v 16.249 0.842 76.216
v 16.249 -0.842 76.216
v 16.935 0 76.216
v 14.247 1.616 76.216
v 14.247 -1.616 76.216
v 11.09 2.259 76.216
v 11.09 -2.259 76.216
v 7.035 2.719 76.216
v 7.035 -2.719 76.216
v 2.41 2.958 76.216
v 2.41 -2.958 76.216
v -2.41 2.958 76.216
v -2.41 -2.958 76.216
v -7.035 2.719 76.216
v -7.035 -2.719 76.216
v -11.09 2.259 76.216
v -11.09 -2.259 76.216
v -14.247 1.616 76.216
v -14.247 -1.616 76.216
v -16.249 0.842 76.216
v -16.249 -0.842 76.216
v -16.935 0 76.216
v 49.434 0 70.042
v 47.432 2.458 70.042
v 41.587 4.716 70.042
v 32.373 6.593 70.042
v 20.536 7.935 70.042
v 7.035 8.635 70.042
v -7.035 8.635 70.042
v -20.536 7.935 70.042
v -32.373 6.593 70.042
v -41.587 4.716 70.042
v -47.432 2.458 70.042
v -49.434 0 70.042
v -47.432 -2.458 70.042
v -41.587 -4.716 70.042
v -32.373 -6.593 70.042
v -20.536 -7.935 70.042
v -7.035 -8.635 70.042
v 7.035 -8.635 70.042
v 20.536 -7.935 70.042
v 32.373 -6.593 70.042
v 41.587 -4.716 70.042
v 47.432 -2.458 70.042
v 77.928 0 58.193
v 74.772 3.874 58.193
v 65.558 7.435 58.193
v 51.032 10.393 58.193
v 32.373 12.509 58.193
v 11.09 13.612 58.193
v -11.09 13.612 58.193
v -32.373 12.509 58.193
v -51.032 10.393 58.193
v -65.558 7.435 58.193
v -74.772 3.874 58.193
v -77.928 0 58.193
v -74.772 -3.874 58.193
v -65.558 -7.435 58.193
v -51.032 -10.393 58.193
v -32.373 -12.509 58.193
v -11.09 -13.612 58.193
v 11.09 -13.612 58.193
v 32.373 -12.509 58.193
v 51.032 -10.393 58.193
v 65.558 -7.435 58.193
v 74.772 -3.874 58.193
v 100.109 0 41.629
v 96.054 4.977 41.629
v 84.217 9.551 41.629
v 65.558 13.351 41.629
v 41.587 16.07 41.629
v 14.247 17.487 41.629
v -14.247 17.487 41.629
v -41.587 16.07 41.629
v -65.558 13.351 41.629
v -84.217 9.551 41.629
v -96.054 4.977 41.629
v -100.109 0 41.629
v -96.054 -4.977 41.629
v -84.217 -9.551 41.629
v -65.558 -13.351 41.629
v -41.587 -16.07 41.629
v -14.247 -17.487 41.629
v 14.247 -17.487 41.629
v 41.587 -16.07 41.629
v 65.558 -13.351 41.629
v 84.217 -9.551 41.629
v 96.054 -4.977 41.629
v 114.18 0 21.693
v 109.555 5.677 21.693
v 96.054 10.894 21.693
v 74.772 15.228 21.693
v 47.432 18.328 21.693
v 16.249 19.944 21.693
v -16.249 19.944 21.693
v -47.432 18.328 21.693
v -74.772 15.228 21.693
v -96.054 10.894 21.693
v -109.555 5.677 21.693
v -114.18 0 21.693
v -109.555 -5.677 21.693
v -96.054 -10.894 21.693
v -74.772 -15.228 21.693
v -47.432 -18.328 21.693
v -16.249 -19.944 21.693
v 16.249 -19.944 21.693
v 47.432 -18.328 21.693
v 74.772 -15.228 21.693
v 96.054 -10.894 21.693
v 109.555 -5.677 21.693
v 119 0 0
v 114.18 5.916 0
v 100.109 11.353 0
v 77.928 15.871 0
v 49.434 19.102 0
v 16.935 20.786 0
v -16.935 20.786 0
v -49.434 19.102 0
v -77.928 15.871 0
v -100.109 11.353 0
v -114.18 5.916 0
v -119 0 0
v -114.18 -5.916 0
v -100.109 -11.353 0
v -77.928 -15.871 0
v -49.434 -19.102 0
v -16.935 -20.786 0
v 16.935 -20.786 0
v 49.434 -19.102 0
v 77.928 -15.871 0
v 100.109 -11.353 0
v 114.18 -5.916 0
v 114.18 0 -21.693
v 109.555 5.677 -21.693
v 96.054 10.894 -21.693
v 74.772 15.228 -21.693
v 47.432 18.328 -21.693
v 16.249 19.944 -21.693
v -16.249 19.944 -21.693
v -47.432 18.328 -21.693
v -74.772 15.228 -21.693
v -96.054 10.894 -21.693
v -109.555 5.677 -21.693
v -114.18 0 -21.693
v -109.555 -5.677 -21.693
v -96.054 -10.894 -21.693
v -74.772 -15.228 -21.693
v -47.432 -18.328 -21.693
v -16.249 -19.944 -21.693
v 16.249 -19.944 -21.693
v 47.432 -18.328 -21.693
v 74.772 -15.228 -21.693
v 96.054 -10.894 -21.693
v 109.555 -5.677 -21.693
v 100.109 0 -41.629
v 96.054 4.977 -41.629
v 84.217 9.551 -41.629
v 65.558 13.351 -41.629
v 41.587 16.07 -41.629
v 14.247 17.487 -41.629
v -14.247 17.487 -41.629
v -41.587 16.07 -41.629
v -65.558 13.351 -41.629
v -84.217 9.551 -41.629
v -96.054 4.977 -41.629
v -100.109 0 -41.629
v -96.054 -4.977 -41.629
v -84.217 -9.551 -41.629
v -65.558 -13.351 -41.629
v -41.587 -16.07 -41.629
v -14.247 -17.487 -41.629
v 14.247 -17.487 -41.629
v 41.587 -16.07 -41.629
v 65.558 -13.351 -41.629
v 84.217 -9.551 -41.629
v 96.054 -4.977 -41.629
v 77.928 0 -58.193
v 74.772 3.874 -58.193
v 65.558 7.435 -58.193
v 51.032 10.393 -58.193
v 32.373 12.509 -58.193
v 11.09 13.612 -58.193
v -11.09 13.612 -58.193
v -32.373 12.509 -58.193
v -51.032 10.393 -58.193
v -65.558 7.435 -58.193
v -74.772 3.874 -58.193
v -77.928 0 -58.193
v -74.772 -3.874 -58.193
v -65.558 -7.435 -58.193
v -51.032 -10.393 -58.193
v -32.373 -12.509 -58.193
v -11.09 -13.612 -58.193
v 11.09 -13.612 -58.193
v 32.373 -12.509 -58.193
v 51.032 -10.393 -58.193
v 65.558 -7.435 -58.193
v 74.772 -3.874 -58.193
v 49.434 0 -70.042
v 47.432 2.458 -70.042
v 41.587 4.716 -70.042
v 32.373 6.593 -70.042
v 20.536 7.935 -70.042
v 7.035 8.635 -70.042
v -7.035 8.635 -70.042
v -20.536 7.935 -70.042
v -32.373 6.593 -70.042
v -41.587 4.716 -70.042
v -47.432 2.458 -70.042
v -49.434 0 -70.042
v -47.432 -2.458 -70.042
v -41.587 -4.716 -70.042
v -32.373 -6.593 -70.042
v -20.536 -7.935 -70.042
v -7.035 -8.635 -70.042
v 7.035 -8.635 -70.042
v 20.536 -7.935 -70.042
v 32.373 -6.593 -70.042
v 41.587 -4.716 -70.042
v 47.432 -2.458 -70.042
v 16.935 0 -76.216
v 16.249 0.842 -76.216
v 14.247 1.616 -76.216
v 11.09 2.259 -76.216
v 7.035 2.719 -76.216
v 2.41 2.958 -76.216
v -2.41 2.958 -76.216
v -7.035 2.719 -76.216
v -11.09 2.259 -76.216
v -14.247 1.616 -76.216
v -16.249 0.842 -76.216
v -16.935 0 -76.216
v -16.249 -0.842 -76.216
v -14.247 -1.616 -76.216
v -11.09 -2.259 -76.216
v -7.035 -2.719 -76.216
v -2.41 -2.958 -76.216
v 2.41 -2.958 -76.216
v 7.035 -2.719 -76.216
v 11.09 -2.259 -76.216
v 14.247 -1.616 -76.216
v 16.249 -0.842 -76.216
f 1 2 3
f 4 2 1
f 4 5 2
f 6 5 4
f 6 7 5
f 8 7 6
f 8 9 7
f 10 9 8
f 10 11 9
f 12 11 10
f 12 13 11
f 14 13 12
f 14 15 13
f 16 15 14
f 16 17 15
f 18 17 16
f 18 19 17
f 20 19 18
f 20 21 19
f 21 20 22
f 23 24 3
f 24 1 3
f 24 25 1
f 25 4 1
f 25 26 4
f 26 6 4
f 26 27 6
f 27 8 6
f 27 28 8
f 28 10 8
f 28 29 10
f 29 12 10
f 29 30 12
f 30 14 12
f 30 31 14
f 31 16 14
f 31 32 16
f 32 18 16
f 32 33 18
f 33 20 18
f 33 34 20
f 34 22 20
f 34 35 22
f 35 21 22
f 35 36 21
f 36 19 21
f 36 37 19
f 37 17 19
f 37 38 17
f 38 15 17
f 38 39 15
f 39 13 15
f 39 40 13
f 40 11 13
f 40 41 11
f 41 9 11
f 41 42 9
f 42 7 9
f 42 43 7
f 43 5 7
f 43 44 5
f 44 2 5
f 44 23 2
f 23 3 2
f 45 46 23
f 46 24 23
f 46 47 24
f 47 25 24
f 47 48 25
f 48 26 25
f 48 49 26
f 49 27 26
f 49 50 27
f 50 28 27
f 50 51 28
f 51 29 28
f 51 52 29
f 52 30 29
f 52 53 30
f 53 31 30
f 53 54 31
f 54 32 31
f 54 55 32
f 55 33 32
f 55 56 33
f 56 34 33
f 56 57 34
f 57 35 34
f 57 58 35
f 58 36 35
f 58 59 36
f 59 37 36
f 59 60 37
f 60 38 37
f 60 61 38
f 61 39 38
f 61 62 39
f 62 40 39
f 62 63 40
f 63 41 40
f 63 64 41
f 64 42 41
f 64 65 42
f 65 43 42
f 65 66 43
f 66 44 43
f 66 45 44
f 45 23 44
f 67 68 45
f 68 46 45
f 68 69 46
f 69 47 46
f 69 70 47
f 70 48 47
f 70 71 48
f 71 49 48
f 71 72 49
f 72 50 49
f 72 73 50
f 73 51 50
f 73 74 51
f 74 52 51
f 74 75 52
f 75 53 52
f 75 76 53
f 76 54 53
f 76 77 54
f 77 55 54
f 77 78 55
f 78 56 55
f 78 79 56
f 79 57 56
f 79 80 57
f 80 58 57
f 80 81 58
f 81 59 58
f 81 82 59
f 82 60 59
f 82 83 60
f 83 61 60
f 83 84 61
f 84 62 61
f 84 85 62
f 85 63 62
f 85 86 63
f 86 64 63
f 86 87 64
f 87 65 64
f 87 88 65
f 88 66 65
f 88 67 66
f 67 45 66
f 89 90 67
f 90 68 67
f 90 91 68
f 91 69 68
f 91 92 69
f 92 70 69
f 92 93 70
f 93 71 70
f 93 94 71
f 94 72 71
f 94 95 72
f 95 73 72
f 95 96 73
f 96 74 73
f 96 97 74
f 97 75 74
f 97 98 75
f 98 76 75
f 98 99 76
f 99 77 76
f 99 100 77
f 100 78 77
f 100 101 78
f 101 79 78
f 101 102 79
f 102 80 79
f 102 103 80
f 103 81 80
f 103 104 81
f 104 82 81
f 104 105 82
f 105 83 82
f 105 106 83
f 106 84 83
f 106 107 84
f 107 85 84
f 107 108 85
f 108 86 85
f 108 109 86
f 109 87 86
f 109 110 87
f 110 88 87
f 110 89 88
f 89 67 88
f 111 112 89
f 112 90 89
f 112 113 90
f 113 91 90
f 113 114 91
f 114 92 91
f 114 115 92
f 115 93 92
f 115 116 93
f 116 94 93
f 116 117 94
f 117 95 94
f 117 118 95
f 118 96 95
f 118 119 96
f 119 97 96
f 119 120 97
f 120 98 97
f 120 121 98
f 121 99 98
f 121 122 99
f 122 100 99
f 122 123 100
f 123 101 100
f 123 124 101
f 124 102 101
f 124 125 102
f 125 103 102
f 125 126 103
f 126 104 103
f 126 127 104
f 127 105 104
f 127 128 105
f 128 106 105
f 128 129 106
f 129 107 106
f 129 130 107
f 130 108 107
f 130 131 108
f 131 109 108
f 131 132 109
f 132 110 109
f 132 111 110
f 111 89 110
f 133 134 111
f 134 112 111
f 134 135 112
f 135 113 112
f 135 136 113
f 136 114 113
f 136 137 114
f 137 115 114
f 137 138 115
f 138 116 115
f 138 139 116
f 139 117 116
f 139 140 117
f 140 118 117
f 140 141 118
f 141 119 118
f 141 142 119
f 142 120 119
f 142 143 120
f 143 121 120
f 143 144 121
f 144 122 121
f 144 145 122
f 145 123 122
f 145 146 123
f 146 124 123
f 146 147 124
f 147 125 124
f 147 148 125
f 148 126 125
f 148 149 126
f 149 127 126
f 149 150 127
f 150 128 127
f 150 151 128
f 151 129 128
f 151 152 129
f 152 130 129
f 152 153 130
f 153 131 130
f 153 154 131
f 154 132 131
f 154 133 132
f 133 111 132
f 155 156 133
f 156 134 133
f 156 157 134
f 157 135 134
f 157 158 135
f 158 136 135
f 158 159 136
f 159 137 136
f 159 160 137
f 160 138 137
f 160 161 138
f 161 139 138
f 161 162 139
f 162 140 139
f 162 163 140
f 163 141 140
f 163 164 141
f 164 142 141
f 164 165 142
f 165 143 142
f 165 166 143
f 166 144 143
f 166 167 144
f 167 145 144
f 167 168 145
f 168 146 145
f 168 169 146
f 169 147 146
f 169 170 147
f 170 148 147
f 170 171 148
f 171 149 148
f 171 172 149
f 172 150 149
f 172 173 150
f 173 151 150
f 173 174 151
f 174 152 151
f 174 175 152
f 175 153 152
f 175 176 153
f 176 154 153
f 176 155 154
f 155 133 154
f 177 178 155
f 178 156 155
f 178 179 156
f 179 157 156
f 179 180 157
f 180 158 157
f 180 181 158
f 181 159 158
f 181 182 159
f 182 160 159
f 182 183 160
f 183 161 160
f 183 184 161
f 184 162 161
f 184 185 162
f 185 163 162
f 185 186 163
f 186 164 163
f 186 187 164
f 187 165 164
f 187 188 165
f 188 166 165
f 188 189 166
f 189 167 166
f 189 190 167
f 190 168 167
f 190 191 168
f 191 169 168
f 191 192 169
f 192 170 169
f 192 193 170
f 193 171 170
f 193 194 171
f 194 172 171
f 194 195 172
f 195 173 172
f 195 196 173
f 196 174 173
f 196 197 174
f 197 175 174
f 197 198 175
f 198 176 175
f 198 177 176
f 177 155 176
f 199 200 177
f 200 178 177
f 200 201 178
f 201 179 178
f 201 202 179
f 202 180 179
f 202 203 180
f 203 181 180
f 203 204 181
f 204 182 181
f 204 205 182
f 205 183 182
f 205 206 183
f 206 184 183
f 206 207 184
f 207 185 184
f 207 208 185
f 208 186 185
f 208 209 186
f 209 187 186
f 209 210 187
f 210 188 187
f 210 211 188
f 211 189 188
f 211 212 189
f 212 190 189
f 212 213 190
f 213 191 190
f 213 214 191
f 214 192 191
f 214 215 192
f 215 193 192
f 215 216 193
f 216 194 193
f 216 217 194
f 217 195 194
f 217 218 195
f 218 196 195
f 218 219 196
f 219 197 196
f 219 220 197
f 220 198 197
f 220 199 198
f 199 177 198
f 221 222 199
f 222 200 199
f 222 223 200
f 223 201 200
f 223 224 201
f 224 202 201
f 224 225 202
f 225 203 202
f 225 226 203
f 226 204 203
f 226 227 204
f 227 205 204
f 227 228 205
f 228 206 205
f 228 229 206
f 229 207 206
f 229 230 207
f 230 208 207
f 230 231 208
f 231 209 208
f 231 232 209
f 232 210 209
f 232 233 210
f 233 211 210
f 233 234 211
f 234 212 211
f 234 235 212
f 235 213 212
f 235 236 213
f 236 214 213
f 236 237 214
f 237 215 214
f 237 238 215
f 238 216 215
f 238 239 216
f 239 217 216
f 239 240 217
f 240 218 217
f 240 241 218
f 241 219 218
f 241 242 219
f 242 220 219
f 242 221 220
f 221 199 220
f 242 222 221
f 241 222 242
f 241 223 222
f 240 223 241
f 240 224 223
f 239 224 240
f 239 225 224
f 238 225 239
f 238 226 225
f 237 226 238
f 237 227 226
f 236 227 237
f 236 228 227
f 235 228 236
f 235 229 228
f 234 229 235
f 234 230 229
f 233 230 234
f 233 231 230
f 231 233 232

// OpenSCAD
// Generated by SolidPython 1.0.1 on 2020-07-29 00:46:52


scale(v = [17, 3, 11]) {
	sphere(r = 7);
}
/***********************************************
*********      SolidPython code:      **********
************************************************
 
# import packages: SolidPython
from solid import *
from solid.utils import *
from itertools import chain, combinations, permutations


class Resize:

    def __init__(self, scad_file):
        self.scad_file = scad_file
        #self.scad_file = import_scad(scad_file)
        # cone/cylinder param:
        self.r1 = 0
        self.r2 = 0
        self.h = 0
        # rectangular prism param:
        self.w = 0
        self.l = 0
        # ellipse param:
        self.r = 0

    # import OpenScad code (file name corresponds to shape)


    # classify shape + parameters
    def assign(self, param1, param2, param3):
        if self.scad_file == 'cone.scad':
            self.r1 = param1
            self.r2 = param2
            self.h = param3
        elif self.scad_file == 'cylinder.scad':
            self.r1 = param1
            self.r2 = param2
            self.h = param3
        elif self.scad_file == 'rectangularPrism.scad':
            self.h = param1
            self.l = param2
            self.w = param3
        else:
            self.r = param1
            self.h = param2

    # resize parameters
    def iterate(self):
        x = range(3, 20, 2)
        i = 1
        if self.scad_file == 'cone.scad':
            tempList = list(permutations(x, 2))
            for temp in tempList:
                param1 = temp[0]
                param2 = temp[1]
                filepath = 'produced_scad_files/' + 'cone' + str(param1) + '_' + str(param2) + '_' + '.scad'
                scad_render_to_file(cylinder(h=param1, r1=param2, r2=0), filepath)

        elif self.scad_file == 'cylinder.scad':
            tempList = list(permutations(x, 3))
            for temp in tempList:
                param1 = temp[0]
                param2 = temp[1]
                filepath = 'produced_scad_files/' + 'cylinder' + str(param1) + '_' + str(param2) + '_' + '.scad'
                scad_render_to_file(cylinder(h=param1, r1=param2, r2=param2), filepath)

        elif self.scad_file == 'rectangularPrism.scad':
            tempList = list(permutations(x, 3))
            for temp in tempList:
                param1 = temp[0]
                param2 = temp[1]
                param3 = temp[2]
                filepath = 'produced_scad_files/' + 'rectangularPrism' + str(param1) + '_' + str(param2) + '_' + str(
                    param3) + '.scad'
                scad_render_to_file(cube(size=(param1, param2, param3)), filepath)

        elif self.scad_file == 'ellipse.scad':
            tempList = list(permutations(x, 4))
            for temp in tempList:
                param1 = temp[0]
                param2 = temp[1]
                param3 = temp[2]
                param4 = temp[3]
                filepath = 'produced_scad_files/' + 'ellipse' + str(param1) + '_' + str(param2) + '_' + str(param3) + '_' + str(param4) + '.scad'
                scad_render_to_file(scale([param1, param2, param3])(sphere(r=param4)), filepath)

    def render_to_scadfile(self):
        scad_render_to_file(scad, 'example.scad') 
 
************************************************/
